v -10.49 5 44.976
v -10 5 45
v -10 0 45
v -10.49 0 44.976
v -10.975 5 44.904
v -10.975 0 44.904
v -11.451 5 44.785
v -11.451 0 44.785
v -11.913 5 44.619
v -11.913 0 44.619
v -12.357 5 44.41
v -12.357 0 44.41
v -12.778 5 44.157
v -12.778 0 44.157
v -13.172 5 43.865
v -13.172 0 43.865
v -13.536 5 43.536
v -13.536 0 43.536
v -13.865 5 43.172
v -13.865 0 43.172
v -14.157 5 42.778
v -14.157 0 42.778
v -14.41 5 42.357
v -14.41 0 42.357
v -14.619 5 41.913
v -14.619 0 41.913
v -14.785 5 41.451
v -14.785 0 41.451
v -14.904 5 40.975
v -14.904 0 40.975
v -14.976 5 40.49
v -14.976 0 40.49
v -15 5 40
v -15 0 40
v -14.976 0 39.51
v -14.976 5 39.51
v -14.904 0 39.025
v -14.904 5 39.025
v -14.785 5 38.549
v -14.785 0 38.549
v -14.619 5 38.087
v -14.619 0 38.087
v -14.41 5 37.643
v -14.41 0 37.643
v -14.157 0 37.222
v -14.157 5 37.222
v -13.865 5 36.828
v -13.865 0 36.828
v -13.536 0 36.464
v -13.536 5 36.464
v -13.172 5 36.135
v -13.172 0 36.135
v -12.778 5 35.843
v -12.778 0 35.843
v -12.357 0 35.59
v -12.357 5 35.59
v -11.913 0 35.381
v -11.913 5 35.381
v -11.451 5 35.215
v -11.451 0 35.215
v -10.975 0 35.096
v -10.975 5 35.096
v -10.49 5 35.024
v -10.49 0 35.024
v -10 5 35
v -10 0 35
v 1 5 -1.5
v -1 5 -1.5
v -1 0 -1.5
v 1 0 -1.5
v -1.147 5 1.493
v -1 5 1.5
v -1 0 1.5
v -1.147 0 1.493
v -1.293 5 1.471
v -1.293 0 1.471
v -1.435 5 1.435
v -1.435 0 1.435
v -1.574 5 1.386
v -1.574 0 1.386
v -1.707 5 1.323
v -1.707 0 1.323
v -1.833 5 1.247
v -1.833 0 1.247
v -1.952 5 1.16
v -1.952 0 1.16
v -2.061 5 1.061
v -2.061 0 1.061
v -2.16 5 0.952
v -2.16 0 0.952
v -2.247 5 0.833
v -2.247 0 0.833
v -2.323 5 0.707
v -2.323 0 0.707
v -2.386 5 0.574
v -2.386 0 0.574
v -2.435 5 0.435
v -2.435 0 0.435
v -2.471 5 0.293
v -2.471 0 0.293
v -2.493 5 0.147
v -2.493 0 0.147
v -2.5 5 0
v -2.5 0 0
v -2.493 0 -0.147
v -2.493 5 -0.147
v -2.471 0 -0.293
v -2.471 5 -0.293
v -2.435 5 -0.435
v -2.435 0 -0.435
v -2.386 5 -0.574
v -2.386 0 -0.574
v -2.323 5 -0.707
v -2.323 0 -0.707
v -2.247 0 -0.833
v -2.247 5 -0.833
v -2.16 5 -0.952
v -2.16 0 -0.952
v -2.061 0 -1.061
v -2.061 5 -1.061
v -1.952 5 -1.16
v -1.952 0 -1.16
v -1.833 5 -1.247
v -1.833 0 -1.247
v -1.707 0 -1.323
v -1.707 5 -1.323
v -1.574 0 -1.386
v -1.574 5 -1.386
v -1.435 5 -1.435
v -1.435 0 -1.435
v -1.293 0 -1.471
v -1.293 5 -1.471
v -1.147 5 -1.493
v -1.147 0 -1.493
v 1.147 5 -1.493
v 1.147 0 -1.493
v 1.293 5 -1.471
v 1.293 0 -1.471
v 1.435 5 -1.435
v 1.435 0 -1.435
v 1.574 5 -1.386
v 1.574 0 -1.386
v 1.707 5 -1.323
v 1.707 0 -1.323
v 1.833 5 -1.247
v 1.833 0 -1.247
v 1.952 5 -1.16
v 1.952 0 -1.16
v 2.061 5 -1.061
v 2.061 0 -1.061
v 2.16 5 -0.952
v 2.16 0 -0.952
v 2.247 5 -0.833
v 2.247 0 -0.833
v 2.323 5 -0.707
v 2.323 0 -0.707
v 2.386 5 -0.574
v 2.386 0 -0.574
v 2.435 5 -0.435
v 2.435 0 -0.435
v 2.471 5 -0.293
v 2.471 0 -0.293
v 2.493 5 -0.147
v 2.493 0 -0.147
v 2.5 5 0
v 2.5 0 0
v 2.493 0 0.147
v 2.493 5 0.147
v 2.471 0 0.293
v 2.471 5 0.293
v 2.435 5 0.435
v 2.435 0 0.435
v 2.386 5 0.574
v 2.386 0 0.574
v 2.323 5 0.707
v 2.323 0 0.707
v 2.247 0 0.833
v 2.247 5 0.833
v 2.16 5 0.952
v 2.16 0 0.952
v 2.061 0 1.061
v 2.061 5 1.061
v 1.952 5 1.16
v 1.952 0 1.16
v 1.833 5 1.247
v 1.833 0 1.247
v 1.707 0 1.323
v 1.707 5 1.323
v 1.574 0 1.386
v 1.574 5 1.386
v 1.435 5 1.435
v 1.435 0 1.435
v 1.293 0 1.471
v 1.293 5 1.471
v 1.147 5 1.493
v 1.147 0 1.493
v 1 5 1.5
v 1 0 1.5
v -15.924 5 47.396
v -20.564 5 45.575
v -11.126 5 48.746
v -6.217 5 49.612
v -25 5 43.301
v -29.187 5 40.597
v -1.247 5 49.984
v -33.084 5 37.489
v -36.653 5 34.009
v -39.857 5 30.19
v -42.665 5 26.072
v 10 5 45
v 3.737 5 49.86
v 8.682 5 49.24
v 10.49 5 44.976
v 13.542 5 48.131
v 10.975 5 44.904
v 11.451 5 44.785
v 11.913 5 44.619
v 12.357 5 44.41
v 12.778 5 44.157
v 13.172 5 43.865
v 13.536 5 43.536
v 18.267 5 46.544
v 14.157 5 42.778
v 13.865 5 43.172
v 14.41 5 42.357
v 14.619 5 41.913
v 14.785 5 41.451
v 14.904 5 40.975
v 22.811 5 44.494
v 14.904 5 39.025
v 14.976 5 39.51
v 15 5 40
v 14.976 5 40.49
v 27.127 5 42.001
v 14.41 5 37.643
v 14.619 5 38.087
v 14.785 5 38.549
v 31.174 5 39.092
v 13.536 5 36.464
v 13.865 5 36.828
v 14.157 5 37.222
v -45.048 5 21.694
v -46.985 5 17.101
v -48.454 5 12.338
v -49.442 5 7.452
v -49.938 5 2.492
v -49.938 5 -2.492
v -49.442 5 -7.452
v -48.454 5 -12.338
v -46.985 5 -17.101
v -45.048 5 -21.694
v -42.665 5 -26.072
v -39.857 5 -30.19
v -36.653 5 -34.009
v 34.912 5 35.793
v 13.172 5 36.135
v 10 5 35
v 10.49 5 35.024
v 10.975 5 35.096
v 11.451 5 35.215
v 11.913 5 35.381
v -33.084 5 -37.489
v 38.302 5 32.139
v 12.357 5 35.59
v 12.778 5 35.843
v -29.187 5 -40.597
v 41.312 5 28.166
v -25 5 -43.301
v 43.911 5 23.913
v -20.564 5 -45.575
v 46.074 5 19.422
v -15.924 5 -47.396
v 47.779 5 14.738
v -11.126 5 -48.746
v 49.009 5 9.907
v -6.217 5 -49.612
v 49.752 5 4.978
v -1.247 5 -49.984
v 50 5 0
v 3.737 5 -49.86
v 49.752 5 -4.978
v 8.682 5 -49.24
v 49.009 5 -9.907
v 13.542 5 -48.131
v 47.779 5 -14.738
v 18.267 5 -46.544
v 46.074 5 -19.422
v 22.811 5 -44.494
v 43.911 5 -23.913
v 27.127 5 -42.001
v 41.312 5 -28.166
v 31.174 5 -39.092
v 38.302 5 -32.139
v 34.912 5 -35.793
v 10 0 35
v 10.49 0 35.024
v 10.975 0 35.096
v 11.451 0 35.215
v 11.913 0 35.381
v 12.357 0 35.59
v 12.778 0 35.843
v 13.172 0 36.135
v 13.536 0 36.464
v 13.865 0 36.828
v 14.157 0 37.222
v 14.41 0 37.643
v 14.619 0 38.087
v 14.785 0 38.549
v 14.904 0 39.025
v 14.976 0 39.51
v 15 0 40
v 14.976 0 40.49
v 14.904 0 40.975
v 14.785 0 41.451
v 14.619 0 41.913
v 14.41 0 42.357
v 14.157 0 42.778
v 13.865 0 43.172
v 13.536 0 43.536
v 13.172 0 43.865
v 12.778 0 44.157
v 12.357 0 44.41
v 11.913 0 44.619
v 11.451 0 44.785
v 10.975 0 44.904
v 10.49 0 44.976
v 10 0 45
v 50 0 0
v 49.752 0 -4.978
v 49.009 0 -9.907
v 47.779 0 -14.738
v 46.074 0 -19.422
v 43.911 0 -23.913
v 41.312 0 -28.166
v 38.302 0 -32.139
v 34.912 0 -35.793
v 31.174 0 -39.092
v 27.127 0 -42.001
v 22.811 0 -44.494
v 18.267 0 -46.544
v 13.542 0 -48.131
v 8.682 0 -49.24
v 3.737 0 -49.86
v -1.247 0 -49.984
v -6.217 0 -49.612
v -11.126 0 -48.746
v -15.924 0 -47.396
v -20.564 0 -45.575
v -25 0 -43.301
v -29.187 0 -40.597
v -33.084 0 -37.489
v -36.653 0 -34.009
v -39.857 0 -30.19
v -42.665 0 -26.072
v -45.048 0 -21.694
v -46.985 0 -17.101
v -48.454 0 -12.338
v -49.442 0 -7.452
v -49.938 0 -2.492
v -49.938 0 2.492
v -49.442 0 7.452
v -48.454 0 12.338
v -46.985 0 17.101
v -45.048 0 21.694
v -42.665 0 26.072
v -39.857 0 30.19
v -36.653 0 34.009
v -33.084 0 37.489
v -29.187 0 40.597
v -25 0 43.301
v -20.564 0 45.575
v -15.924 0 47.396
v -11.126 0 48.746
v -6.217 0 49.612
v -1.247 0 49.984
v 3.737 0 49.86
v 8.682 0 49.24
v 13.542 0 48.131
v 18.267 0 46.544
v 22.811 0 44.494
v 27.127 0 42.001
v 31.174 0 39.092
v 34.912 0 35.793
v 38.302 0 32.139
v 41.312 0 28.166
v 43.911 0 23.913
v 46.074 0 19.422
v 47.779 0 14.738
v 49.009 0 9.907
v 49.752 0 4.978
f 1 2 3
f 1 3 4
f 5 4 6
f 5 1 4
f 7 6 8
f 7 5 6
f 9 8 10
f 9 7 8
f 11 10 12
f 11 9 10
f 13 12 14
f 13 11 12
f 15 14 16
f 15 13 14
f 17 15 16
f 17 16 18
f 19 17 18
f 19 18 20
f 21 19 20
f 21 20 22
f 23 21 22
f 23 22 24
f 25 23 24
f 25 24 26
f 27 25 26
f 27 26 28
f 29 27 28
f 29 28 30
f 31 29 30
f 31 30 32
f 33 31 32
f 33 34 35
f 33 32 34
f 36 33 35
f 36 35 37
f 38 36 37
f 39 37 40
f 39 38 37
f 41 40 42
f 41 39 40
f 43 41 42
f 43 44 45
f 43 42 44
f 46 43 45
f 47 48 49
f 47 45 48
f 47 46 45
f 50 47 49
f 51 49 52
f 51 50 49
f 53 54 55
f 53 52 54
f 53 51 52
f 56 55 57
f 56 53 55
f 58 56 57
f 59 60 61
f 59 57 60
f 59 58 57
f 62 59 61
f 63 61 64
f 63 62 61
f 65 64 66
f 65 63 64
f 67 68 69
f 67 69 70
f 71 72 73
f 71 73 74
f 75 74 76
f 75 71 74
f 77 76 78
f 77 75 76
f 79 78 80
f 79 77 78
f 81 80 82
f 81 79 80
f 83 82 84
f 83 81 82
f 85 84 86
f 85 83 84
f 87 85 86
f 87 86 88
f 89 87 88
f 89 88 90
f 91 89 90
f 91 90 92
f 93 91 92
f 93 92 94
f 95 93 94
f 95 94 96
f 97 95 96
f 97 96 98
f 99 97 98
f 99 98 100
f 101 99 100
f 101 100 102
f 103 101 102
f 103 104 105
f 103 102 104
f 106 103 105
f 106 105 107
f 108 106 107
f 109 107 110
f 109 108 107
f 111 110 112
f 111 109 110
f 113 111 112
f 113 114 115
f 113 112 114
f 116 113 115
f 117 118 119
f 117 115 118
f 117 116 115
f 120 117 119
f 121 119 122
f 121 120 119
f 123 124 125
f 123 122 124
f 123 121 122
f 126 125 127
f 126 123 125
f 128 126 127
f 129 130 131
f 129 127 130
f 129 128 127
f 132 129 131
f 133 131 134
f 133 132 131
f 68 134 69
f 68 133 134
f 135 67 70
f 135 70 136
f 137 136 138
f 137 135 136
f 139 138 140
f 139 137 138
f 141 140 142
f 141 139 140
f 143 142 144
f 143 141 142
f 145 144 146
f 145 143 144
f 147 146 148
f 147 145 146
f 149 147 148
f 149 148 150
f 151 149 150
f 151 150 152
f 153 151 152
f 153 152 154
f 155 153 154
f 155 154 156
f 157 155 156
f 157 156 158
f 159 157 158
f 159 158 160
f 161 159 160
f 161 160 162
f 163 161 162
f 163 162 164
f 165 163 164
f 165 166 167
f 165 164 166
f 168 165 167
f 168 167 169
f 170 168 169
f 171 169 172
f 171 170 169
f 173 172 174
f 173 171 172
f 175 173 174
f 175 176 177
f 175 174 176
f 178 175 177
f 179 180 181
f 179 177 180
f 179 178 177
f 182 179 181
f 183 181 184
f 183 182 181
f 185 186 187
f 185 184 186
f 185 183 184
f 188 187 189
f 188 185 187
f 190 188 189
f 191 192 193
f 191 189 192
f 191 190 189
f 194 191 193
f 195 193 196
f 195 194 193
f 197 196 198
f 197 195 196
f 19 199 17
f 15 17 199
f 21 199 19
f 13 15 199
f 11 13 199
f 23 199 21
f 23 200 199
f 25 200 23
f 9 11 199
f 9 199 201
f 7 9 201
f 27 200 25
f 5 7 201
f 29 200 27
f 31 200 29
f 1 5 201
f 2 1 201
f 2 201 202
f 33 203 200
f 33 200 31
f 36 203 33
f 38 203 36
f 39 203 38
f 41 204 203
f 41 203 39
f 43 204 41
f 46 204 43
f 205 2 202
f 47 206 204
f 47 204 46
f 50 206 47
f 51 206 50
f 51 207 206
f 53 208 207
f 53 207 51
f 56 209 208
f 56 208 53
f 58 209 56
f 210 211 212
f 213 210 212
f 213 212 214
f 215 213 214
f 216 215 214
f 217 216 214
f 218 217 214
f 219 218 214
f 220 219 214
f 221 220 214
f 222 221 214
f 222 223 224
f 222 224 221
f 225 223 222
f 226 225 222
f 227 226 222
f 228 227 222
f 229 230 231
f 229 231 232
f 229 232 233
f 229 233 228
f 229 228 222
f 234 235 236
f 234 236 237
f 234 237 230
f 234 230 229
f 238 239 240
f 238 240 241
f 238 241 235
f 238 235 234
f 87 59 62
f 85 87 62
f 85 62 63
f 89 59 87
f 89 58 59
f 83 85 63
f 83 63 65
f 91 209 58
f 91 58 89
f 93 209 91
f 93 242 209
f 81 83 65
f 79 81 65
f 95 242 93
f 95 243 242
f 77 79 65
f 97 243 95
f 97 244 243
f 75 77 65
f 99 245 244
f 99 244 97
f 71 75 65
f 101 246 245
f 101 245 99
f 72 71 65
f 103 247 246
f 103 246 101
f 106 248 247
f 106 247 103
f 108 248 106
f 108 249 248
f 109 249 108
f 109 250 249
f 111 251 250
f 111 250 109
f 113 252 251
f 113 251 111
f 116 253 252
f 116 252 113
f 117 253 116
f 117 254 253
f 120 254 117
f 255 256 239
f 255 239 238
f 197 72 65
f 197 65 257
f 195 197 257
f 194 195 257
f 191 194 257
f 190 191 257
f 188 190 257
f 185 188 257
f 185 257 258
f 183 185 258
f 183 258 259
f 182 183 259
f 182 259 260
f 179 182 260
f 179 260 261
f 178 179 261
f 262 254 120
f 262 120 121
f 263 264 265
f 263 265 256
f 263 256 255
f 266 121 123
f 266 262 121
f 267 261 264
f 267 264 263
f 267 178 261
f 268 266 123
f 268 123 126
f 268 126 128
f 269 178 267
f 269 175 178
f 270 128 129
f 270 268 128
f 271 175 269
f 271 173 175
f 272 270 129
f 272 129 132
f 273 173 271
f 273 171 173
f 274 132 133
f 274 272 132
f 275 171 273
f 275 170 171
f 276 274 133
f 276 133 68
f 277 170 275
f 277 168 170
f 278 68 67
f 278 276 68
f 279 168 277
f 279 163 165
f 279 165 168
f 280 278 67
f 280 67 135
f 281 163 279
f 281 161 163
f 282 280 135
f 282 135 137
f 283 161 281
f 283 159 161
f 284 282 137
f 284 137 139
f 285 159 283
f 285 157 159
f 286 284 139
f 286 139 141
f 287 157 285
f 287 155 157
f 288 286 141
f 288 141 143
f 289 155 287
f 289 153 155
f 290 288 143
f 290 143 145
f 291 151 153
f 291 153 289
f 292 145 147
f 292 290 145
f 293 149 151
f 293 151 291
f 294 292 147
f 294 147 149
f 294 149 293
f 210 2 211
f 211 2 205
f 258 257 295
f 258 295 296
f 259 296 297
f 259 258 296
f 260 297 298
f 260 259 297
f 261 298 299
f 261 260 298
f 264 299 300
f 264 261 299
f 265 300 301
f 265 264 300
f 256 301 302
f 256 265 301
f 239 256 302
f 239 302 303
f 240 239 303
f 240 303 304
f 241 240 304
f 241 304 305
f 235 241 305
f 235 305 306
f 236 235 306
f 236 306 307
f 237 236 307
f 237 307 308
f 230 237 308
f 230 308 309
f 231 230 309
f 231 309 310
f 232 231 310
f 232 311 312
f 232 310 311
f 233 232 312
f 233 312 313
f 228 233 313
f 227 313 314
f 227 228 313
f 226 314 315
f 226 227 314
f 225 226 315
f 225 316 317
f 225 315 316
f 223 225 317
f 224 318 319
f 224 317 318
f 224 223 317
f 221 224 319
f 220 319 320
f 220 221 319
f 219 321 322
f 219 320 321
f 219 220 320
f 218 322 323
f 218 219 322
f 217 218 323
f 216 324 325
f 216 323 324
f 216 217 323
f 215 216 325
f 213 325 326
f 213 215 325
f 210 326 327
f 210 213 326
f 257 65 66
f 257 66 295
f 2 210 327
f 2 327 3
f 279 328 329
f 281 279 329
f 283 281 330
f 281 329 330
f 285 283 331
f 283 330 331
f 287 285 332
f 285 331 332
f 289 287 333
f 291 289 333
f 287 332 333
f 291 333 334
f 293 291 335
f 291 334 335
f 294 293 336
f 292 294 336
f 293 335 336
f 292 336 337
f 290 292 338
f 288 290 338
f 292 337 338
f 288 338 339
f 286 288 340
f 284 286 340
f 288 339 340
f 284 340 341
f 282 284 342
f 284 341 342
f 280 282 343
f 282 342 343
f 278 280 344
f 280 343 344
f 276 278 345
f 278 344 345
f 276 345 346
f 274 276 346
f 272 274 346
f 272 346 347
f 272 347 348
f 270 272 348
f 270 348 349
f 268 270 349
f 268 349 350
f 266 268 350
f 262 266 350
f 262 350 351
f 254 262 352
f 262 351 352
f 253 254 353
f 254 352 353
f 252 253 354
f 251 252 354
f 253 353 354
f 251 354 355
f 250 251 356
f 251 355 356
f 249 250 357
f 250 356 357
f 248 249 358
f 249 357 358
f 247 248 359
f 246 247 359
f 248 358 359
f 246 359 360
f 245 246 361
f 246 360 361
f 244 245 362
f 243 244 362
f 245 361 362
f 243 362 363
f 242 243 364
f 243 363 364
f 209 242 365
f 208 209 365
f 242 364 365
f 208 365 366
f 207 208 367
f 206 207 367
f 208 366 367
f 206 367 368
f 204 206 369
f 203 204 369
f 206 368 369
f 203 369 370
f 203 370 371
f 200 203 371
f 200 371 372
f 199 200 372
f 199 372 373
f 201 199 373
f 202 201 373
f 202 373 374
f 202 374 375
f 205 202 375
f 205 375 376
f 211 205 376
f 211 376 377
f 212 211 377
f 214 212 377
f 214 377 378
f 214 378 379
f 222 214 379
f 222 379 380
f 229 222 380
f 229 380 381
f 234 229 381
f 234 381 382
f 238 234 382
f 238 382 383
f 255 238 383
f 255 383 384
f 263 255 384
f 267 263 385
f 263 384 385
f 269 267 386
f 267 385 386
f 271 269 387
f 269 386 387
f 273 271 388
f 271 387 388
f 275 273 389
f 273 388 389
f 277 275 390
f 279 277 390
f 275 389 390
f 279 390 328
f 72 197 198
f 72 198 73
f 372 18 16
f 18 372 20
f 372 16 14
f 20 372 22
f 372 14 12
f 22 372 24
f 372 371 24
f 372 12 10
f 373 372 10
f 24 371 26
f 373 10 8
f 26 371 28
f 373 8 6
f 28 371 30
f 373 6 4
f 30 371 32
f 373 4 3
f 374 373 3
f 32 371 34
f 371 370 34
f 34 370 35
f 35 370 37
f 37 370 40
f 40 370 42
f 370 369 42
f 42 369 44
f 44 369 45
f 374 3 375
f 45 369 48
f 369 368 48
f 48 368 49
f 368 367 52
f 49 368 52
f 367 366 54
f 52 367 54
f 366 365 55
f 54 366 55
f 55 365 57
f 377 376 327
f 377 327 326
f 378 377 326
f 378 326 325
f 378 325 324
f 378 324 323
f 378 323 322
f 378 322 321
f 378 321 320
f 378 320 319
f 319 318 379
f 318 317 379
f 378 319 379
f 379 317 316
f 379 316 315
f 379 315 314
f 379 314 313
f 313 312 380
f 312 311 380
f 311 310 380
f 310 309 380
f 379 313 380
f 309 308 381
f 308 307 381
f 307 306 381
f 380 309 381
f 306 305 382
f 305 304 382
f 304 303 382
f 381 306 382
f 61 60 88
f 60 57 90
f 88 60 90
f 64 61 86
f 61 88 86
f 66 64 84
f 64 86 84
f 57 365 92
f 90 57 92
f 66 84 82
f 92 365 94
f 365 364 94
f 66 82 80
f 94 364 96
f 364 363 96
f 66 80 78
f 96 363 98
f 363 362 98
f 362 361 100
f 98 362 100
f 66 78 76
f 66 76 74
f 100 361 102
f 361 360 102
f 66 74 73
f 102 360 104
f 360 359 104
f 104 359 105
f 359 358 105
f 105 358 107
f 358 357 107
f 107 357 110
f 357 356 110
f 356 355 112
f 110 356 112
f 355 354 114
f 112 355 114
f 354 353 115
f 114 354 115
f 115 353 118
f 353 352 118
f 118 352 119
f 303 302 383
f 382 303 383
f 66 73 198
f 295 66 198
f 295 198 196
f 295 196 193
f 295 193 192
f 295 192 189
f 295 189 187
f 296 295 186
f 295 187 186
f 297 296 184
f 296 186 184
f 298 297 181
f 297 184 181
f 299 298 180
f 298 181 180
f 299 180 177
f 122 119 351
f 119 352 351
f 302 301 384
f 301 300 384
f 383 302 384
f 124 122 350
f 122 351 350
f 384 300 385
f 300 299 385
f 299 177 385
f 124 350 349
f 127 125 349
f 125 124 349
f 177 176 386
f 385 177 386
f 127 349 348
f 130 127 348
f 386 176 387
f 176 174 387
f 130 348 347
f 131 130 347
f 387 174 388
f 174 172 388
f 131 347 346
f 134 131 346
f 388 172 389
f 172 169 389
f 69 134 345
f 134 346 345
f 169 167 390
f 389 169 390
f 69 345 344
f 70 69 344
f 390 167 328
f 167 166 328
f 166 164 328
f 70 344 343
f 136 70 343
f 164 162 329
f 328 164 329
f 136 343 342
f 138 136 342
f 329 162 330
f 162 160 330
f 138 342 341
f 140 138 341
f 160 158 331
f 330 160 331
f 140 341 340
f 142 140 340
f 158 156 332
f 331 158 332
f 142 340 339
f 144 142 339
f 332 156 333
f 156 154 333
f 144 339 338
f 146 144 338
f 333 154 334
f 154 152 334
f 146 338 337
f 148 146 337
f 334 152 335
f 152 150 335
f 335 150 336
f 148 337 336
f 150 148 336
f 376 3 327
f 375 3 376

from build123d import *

# Parameters (mm, degrees)
SKETCH1_R           = 50
BOSS_EXTRUDE1_DEPTH = 5
CUT_EXTRUDE1_DEPTH  = 6
CUT_EXTRUDE2_DEPTH  = 6


with BuildPart() as part:
    # Sketch1 → Boss-Extrude1 (new body)
    with BuildSketch(Plane(origin=(0, 0, 0), x_dir=(1, 0, 0), z_dir=(0, 1, 0))):
        Circle(SKETCH1_R)
    extrude(amount=BOSS_EXTRUDE1_DEPTH)

    # Sketch3 → Cut-Extrude1 (cut, through all)
    with BuildSketch(Plane(origin=(0, 5, 0), x_dir=(1, 0, 0), z_dir=(0, 1, 0))):
        with BuildLine():
            Line((-1, 1.5), (1, 1.5))
            ThreePointArc((1, 1.5), (2.5, 0), (1, -1.5))
            Line((1, -1.5), (-1, -1.5))
            ThreePointArc((-1, -1.5), (-2.5, 0), (-1, 1.5))
        make_face()
    extrude(amount=-CUT_EXTRUDE1_DEPTH, mode=Mode.SUBTRACT)

    # Sketch5 → Cut-Extrude2 (cut, through all)
    with BuildSketch(Plane(origin=(0, 5, 0), x_dir=(1, 0, 0), z_dir=(0, 1, 0))):
        with BuildLine():
            Line((-10, -35), (10, -35))
            ThreePointArc((10, -35), (15, -40), (10, -45))
            Line((10, -45), (-10, -45))
            ThreePointArc((-10, -45), (-15, -40), (-10, -35))
        make_face()
    extrude(amount=-CUT_EXTRUDE2_DEPTH, mode=Mode.SUBTRACT)


solid = part.part
